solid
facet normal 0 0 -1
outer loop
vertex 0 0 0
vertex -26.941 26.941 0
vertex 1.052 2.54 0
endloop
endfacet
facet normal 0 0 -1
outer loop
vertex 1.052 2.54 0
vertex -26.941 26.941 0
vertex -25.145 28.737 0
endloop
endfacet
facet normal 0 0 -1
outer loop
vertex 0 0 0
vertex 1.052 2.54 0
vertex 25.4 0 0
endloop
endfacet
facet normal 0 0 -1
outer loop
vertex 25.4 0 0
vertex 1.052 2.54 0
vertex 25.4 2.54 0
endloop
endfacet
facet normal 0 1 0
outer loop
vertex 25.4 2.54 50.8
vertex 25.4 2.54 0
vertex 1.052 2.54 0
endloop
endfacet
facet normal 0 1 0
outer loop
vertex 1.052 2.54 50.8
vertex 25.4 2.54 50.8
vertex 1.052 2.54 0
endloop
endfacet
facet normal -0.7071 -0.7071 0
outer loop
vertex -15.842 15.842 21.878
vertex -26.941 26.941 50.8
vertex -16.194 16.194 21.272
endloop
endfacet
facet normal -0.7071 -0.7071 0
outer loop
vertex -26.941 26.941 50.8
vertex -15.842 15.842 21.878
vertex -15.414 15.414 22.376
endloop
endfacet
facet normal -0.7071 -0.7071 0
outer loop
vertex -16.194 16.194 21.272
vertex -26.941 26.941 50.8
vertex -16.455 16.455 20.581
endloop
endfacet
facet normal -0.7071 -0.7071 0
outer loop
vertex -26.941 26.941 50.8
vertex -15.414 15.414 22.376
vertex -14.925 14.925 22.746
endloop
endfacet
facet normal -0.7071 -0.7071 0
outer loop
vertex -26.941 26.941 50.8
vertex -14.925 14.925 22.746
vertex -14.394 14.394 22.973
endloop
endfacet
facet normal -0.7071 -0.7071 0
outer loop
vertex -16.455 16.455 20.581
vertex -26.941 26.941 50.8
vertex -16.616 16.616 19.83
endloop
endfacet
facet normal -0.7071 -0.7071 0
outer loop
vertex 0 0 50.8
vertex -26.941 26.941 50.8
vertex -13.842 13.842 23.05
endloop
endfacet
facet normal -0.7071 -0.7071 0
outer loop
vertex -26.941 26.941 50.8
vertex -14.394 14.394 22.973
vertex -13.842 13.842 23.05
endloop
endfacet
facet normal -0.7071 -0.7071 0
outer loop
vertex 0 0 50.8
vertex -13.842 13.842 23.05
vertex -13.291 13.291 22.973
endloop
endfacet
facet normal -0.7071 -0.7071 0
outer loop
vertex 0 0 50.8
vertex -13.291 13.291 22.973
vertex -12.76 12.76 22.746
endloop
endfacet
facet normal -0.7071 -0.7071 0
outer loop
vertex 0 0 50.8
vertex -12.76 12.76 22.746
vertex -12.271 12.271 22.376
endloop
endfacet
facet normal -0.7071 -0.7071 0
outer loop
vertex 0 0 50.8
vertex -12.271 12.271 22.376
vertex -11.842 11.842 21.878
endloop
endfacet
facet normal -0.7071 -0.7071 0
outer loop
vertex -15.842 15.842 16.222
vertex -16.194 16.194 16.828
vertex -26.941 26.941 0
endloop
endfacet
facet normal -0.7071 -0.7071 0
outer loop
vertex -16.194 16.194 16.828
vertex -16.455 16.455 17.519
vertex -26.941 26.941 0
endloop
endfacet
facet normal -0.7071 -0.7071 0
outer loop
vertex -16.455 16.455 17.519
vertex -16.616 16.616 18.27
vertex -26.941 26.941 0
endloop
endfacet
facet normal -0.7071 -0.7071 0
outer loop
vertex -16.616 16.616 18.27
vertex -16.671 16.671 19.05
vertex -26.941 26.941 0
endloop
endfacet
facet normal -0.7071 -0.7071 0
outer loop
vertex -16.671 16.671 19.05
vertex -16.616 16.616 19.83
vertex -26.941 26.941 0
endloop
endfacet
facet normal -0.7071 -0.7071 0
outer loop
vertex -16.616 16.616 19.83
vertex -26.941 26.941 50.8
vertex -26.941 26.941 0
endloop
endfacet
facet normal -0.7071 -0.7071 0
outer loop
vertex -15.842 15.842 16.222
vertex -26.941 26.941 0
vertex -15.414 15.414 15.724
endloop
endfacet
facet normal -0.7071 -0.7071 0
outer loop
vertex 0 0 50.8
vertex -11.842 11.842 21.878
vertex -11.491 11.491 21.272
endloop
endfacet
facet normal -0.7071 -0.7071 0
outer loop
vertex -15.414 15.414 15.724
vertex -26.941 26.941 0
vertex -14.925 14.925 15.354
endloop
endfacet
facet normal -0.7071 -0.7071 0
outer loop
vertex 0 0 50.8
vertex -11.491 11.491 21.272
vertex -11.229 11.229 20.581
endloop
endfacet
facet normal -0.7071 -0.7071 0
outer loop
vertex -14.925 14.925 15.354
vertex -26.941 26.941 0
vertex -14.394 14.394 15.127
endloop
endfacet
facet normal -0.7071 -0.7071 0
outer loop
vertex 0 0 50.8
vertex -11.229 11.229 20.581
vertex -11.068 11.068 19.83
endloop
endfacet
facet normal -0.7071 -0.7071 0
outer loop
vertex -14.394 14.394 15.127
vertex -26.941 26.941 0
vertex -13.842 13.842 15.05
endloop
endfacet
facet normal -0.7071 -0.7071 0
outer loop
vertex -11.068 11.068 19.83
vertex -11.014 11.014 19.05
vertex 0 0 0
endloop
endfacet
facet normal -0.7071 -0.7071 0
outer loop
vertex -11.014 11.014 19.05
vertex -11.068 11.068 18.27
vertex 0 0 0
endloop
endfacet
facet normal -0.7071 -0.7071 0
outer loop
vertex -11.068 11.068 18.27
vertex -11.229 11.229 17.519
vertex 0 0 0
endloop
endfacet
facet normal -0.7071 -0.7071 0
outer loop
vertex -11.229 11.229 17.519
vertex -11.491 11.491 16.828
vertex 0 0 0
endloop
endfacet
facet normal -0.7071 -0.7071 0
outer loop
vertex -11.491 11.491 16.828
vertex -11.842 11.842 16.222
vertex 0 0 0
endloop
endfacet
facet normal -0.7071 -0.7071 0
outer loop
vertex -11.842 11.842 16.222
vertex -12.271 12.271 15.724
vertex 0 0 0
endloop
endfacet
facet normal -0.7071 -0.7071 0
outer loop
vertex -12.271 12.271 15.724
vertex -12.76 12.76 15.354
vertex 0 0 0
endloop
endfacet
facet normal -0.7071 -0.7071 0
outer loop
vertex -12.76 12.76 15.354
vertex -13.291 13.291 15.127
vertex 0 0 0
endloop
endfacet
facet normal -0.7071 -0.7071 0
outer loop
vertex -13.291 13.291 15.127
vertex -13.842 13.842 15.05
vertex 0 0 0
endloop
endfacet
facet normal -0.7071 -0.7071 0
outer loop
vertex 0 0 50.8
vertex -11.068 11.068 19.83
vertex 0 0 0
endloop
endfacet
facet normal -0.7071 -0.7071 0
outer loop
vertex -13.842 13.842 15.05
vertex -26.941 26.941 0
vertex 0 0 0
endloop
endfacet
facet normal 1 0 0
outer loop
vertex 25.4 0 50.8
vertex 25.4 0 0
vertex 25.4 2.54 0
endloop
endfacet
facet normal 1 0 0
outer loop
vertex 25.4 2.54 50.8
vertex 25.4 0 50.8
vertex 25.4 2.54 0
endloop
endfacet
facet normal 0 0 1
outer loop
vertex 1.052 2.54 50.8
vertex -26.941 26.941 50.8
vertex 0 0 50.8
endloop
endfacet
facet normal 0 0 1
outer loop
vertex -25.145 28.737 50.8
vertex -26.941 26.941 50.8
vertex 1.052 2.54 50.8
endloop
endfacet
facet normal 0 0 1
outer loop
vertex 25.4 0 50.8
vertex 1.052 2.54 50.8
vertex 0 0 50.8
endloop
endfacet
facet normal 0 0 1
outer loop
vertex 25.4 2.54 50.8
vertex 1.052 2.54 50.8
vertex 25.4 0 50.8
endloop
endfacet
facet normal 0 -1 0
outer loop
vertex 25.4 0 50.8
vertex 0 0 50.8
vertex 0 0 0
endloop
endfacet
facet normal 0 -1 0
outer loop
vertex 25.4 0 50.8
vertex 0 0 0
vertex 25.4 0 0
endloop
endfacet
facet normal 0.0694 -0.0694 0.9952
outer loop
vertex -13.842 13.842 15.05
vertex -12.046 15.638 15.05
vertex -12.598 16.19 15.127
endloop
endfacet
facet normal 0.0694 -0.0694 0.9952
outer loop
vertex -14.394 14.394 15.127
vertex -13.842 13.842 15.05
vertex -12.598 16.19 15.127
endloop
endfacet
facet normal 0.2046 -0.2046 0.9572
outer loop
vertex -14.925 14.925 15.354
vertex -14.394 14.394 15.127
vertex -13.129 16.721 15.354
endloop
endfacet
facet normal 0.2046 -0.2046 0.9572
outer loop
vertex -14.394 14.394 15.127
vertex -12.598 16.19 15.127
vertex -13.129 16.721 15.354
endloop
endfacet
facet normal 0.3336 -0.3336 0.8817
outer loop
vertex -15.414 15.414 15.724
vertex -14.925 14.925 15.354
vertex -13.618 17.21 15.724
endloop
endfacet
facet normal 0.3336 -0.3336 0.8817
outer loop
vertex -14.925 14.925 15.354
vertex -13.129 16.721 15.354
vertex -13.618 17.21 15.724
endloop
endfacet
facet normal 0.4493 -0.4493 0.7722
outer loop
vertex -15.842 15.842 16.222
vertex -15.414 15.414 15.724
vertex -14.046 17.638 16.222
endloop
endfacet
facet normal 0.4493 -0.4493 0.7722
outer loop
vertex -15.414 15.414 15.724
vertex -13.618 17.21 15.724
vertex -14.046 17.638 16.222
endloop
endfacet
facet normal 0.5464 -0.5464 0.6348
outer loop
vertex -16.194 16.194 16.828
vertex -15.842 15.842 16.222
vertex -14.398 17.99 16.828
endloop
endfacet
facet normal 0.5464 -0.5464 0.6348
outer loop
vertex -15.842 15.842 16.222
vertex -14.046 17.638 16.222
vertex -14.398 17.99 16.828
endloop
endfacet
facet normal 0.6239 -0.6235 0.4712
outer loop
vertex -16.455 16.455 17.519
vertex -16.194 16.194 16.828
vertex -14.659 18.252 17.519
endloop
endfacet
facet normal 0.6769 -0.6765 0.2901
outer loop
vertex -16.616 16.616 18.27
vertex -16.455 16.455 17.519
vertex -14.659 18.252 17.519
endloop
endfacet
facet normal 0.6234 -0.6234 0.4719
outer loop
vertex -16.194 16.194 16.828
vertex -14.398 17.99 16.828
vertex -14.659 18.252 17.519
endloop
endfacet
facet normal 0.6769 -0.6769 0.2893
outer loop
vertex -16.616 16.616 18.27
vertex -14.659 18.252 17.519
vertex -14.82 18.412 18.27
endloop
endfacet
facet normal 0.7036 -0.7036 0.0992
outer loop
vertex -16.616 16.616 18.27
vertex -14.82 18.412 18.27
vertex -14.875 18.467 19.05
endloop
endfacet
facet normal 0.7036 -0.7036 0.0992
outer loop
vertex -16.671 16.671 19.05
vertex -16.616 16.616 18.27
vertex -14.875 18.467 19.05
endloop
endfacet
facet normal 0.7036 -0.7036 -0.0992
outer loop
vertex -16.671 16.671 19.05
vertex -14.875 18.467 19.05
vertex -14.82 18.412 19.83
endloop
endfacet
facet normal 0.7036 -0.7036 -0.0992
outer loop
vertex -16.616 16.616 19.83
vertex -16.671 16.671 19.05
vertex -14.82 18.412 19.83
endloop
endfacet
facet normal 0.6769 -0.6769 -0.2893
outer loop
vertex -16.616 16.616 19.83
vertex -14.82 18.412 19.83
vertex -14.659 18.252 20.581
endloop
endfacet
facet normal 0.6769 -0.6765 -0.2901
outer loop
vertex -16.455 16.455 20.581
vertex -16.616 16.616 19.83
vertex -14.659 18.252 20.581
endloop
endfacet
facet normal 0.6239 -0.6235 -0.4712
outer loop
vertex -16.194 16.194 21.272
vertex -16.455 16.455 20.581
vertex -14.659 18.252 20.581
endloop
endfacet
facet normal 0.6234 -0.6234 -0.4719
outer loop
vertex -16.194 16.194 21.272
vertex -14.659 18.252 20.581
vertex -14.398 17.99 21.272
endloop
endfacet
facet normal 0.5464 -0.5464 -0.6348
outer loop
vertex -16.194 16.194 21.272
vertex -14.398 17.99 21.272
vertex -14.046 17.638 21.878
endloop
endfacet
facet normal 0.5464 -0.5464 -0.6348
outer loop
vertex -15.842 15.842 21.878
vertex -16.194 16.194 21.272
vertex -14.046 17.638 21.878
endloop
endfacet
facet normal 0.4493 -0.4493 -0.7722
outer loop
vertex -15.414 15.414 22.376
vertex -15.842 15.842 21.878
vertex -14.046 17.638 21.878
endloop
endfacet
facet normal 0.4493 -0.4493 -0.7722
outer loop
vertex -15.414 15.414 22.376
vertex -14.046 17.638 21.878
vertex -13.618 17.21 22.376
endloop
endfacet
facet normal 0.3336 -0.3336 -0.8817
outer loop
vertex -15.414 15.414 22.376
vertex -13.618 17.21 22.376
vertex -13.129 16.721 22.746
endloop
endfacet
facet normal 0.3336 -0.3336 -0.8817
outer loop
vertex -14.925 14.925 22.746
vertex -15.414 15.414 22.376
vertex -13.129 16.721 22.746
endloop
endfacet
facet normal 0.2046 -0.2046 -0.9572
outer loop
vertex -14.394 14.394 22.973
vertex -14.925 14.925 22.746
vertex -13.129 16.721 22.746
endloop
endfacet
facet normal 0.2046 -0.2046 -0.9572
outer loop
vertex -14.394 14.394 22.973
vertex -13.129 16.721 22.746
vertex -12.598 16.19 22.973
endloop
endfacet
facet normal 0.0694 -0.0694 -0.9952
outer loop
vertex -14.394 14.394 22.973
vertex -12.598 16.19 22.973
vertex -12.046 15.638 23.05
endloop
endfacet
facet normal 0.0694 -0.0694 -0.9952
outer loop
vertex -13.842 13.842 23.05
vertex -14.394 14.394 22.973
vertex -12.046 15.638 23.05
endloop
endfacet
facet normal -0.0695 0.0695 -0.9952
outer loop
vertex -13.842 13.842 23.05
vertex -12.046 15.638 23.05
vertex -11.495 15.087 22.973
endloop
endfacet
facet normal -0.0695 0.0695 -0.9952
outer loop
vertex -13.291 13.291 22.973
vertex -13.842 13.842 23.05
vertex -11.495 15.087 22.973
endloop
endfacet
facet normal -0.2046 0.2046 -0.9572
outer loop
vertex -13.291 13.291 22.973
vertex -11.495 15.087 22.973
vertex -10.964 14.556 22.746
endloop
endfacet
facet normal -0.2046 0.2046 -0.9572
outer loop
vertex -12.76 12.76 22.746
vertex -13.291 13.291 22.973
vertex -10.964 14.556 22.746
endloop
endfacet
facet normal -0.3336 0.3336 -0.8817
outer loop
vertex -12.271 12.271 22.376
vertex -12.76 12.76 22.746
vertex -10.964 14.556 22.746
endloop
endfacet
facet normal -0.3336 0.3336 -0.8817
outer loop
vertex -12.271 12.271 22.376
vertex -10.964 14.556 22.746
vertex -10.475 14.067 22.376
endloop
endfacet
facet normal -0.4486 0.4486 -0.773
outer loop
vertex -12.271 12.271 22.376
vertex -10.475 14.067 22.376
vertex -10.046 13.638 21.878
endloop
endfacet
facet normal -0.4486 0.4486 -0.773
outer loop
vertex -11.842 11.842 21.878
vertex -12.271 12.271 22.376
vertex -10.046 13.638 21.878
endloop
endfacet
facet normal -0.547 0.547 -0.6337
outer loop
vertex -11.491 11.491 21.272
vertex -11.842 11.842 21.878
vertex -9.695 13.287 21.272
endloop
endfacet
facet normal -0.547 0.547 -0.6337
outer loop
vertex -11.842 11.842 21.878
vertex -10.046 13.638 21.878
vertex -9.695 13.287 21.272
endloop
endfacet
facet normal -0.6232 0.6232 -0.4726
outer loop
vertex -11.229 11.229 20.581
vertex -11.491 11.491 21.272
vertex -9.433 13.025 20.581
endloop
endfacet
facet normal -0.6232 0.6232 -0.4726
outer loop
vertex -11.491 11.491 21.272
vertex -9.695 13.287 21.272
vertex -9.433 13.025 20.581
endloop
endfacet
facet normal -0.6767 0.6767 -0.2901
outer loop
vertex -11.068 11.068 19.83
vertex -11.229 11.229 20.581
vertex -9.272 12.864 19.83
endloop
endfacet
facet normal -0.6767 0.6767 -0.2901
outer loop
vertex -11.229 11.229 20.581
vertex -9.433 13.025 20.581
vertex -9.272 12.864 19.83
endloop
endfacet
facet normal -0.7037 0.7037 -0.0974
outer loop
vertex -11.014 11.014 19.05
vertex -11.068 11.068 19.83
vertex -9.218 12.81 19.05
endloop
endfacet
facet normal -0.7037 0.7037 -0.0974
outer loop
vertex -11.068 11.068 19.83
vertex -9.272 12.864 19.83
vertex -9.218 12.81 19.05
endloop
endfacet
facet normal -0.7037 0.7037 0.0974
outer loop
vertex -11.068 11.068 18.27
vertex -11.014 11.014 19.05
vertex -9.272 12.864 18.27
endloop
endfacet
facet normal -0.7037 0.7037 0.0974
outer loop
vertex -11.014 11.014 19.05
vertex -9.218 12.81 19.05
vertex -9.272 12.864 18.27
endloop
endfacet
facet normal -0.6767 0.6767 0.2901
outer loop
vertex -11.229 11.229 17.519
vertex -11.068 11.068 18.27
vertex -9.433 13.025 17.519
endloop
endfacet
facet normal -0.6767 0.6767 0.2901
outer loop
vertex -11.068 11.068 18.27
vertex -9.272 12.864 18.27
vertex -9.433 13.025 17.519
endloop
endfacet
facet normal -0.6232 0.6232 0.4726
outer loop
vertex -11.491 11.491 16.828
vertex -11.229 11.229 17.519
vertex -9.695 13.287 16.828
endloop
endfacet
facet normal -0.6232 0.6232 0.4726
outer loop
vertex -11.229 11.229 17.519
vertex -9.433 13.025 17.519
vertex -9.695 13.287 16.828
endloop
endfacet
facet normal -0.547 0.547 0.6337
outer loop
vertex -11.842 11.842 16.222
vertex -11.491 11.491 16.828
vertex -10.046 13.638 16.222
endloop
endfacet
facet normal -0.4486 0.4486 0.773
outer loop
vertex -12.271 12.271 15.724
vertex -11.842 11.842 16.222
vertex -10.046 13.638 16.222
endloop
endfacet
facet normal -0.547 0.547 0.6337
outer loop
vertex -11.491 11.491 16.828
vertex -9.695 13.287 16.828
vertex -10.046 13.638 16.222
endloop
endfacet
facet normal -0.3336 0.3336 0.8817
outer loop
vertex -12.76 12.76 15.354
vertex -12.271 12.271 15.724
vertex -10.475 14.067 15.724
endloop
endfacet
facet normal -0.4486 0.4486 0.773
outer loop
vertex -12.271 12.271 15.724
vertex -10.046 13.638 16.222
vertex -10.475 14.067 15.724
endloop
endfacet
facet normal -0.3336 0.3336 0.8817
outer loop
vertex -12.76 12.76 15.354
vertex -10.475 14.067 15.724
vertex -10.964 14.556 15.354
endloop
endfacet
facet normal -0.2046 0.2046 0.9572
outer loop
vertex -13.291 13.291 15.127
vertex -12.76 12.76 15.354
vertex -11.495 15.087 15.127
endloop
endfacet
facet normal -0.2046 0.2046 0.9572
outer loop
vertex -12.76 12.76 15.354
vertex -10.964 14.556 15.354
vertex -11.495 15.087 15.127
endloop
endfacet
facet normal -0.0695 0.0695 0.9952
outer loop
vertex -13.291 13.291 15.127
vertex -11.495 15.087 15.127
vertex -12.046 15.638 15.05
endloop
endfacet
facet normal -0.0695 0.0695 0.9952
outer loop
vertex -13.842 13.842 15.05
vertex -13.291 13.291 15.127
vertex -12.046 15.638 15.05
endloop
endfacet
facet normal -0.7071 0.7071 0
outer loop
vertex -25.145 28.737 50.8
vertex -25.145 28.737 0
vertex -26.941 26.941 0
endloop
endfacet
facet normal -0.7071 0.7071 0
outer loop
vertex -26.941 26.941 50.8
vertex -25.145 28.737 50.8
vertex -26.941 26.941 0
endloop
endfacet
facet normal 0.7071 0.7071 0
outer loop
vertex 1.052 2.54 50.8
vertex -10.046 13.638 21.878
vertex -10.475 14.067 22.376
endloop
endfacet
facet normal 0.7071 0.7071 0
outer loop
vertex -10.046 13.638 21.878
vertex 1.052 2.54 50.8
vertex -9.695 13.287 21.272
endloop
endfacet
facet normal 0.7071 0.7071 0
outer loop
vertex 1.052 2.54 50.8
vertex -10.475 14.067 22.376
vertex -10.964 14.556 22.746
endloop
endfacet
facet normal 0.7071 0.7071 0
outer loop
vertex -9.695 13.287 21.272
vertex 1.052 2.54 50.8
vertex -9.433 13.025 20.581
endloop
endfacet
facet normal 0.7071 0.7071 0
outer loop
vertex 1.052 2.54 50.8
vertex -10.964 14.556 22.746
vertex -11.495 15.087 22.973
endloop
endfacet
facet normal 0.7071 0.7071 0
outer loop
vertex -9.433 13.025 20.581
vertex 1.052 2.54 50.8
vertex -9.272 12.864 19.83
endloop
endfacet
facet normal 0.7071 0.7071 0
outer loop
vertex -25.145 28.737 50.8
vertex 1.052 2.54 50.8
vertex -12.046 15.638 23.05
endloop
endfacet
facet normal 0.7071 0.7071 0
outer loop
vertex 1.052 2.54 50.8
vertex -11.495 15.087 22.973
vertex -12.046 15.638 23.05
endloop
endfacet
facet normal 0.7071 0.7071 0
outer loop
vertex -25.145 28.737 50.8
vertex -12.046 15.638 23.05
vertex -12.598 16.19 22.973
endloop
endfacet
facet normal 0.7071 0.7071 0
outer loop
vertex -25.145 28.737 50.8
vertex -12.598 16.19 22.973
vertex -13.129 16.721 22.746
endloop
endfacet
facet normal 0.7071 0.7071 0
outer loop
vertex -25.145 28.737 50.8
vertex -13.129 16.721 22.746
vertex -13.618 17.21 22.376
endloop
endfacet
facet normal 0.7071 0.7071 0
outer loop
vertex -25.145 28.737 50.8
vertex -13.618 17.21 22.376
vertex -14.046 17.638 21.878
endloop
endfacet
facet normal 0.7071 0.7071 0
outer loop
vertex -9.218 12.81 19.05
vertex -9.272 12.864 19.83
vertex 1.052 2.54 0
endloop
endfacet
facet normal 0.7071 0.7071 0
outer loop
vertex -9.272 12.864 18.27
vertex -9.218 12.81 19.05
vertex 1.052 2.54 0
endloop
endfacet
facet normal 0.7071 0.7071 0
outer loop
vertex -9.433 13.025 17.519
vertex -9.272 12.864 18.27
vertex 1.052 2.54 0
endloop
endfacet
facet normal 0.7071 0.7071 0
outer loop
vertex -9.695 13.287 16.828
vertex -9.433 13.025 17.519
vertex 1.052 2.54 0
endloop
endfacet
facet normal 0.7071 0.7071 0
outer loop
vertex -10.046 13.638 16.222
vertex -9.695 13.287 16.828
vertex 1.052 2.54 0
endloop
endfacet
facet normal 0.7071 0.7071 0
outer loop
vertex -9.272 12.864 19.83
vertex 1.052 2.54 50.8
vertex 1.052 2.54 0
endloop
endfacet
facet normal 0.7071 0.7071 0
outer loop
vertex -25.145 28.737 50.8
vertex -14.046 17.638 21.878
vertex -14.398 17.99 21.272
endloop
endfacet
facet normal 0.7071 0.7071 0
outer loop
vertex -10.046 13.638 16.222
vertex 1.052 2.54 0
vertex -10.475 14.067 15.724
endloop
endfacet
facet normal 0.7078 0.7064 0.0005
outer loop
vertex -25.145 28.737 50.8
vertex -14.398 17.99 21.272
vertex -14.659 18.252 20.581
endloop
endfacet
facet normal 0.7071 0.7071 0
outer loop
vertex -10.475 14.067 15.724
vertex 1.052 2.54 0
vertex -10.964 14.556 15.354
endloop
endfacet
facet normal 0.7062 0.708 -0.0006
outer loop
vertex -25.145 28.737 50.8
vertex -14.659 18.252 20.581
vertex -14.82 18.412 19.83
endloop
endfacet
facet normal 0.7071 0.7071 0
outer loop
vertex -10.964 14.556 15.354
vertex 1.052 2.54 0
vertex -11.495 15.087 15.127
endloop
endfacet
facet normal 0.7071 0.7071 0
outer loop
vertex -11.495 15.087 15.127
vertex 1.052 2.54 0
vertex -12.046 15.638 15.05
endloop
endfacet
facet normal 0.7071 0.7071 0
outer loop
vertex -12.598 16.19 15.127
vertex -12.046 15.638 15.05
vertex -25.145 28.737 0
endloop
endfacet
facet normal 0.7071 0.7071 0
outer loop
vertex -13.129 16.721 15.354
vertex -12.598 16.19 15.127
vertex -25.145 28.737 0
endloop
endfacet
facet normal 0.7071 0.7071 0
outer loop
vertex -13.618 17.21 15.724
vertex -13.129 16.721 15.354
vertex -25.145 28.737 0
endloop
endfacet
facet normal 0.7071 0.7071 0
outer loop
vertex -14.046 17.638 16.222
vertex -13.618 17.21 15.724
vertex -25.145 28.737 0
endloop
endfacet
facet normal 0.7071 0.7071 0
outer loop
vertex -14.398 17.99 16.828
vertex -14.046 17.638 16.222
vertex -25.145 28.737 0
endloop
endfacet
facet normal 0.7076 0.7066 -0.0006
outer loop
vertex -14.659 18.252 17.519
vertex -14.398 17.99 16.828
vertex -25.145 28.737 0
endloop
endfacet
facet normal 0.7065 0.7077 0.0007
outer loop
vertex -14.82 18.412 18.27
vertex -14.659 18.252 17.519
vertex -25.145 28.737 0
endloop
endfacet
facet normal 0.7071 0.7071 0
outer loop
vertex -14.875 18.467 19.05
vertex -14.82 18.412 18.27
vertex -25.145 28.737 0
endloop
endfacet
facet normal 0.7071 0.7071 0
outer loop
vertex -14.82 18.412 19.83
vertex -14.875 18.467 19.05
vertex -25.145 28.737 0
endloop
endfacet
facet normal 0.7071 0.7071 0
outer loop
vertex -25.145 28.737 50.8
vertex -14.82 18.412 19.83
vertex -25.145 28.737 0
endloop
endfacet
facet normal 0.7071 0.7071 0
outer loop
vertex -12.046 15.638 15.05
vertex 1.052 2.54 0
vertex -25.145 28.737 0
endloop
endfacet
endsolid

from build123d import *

# Parameters (mm, degrees)
BASE_DEPTH      = 50.8
AXLE_HOLE_REACH = 23.59
SKETCH2_R       = 4


with BuildPart() as part:
    # Sketch1 → base (new body)
    with BuildSketch(Plane.XY):
        Polygon((-26.940768363, 26.940768363), (0, 0), (25.4, 0), (25.4, 2.54), (1.052102448, 2.54), (-25.144717139, 28.736819587), align=None)
    extrude(amount=BASE_DEPTH)

    # Sketch2 → axle hole (cut, up to next)
    with BuildSketch(Plane(origin=(1.796051224, 1.796051224, 0), x_dir=(0, 0, -1), z_dir=(0.707106781, 0.707106781, 0)), mode=Mode.PRIVATE) as axle_hole_sk1:
        with Locations((-19.05, 19.576051224)):
            Circle(SKETCH2_R)
    axle_hole_tool1 = extrude(axle_hole_sk1.sketch, amount=-AXLE_HOLE_REACH, mode=Mode.PRIVATE) & part.part
    add(axle_hole_tool1.solids().sort_by_distance((-12.046307, 15.63841, 19.05))[0], mode=Mode.SUBTRACT)


solid = part.part
